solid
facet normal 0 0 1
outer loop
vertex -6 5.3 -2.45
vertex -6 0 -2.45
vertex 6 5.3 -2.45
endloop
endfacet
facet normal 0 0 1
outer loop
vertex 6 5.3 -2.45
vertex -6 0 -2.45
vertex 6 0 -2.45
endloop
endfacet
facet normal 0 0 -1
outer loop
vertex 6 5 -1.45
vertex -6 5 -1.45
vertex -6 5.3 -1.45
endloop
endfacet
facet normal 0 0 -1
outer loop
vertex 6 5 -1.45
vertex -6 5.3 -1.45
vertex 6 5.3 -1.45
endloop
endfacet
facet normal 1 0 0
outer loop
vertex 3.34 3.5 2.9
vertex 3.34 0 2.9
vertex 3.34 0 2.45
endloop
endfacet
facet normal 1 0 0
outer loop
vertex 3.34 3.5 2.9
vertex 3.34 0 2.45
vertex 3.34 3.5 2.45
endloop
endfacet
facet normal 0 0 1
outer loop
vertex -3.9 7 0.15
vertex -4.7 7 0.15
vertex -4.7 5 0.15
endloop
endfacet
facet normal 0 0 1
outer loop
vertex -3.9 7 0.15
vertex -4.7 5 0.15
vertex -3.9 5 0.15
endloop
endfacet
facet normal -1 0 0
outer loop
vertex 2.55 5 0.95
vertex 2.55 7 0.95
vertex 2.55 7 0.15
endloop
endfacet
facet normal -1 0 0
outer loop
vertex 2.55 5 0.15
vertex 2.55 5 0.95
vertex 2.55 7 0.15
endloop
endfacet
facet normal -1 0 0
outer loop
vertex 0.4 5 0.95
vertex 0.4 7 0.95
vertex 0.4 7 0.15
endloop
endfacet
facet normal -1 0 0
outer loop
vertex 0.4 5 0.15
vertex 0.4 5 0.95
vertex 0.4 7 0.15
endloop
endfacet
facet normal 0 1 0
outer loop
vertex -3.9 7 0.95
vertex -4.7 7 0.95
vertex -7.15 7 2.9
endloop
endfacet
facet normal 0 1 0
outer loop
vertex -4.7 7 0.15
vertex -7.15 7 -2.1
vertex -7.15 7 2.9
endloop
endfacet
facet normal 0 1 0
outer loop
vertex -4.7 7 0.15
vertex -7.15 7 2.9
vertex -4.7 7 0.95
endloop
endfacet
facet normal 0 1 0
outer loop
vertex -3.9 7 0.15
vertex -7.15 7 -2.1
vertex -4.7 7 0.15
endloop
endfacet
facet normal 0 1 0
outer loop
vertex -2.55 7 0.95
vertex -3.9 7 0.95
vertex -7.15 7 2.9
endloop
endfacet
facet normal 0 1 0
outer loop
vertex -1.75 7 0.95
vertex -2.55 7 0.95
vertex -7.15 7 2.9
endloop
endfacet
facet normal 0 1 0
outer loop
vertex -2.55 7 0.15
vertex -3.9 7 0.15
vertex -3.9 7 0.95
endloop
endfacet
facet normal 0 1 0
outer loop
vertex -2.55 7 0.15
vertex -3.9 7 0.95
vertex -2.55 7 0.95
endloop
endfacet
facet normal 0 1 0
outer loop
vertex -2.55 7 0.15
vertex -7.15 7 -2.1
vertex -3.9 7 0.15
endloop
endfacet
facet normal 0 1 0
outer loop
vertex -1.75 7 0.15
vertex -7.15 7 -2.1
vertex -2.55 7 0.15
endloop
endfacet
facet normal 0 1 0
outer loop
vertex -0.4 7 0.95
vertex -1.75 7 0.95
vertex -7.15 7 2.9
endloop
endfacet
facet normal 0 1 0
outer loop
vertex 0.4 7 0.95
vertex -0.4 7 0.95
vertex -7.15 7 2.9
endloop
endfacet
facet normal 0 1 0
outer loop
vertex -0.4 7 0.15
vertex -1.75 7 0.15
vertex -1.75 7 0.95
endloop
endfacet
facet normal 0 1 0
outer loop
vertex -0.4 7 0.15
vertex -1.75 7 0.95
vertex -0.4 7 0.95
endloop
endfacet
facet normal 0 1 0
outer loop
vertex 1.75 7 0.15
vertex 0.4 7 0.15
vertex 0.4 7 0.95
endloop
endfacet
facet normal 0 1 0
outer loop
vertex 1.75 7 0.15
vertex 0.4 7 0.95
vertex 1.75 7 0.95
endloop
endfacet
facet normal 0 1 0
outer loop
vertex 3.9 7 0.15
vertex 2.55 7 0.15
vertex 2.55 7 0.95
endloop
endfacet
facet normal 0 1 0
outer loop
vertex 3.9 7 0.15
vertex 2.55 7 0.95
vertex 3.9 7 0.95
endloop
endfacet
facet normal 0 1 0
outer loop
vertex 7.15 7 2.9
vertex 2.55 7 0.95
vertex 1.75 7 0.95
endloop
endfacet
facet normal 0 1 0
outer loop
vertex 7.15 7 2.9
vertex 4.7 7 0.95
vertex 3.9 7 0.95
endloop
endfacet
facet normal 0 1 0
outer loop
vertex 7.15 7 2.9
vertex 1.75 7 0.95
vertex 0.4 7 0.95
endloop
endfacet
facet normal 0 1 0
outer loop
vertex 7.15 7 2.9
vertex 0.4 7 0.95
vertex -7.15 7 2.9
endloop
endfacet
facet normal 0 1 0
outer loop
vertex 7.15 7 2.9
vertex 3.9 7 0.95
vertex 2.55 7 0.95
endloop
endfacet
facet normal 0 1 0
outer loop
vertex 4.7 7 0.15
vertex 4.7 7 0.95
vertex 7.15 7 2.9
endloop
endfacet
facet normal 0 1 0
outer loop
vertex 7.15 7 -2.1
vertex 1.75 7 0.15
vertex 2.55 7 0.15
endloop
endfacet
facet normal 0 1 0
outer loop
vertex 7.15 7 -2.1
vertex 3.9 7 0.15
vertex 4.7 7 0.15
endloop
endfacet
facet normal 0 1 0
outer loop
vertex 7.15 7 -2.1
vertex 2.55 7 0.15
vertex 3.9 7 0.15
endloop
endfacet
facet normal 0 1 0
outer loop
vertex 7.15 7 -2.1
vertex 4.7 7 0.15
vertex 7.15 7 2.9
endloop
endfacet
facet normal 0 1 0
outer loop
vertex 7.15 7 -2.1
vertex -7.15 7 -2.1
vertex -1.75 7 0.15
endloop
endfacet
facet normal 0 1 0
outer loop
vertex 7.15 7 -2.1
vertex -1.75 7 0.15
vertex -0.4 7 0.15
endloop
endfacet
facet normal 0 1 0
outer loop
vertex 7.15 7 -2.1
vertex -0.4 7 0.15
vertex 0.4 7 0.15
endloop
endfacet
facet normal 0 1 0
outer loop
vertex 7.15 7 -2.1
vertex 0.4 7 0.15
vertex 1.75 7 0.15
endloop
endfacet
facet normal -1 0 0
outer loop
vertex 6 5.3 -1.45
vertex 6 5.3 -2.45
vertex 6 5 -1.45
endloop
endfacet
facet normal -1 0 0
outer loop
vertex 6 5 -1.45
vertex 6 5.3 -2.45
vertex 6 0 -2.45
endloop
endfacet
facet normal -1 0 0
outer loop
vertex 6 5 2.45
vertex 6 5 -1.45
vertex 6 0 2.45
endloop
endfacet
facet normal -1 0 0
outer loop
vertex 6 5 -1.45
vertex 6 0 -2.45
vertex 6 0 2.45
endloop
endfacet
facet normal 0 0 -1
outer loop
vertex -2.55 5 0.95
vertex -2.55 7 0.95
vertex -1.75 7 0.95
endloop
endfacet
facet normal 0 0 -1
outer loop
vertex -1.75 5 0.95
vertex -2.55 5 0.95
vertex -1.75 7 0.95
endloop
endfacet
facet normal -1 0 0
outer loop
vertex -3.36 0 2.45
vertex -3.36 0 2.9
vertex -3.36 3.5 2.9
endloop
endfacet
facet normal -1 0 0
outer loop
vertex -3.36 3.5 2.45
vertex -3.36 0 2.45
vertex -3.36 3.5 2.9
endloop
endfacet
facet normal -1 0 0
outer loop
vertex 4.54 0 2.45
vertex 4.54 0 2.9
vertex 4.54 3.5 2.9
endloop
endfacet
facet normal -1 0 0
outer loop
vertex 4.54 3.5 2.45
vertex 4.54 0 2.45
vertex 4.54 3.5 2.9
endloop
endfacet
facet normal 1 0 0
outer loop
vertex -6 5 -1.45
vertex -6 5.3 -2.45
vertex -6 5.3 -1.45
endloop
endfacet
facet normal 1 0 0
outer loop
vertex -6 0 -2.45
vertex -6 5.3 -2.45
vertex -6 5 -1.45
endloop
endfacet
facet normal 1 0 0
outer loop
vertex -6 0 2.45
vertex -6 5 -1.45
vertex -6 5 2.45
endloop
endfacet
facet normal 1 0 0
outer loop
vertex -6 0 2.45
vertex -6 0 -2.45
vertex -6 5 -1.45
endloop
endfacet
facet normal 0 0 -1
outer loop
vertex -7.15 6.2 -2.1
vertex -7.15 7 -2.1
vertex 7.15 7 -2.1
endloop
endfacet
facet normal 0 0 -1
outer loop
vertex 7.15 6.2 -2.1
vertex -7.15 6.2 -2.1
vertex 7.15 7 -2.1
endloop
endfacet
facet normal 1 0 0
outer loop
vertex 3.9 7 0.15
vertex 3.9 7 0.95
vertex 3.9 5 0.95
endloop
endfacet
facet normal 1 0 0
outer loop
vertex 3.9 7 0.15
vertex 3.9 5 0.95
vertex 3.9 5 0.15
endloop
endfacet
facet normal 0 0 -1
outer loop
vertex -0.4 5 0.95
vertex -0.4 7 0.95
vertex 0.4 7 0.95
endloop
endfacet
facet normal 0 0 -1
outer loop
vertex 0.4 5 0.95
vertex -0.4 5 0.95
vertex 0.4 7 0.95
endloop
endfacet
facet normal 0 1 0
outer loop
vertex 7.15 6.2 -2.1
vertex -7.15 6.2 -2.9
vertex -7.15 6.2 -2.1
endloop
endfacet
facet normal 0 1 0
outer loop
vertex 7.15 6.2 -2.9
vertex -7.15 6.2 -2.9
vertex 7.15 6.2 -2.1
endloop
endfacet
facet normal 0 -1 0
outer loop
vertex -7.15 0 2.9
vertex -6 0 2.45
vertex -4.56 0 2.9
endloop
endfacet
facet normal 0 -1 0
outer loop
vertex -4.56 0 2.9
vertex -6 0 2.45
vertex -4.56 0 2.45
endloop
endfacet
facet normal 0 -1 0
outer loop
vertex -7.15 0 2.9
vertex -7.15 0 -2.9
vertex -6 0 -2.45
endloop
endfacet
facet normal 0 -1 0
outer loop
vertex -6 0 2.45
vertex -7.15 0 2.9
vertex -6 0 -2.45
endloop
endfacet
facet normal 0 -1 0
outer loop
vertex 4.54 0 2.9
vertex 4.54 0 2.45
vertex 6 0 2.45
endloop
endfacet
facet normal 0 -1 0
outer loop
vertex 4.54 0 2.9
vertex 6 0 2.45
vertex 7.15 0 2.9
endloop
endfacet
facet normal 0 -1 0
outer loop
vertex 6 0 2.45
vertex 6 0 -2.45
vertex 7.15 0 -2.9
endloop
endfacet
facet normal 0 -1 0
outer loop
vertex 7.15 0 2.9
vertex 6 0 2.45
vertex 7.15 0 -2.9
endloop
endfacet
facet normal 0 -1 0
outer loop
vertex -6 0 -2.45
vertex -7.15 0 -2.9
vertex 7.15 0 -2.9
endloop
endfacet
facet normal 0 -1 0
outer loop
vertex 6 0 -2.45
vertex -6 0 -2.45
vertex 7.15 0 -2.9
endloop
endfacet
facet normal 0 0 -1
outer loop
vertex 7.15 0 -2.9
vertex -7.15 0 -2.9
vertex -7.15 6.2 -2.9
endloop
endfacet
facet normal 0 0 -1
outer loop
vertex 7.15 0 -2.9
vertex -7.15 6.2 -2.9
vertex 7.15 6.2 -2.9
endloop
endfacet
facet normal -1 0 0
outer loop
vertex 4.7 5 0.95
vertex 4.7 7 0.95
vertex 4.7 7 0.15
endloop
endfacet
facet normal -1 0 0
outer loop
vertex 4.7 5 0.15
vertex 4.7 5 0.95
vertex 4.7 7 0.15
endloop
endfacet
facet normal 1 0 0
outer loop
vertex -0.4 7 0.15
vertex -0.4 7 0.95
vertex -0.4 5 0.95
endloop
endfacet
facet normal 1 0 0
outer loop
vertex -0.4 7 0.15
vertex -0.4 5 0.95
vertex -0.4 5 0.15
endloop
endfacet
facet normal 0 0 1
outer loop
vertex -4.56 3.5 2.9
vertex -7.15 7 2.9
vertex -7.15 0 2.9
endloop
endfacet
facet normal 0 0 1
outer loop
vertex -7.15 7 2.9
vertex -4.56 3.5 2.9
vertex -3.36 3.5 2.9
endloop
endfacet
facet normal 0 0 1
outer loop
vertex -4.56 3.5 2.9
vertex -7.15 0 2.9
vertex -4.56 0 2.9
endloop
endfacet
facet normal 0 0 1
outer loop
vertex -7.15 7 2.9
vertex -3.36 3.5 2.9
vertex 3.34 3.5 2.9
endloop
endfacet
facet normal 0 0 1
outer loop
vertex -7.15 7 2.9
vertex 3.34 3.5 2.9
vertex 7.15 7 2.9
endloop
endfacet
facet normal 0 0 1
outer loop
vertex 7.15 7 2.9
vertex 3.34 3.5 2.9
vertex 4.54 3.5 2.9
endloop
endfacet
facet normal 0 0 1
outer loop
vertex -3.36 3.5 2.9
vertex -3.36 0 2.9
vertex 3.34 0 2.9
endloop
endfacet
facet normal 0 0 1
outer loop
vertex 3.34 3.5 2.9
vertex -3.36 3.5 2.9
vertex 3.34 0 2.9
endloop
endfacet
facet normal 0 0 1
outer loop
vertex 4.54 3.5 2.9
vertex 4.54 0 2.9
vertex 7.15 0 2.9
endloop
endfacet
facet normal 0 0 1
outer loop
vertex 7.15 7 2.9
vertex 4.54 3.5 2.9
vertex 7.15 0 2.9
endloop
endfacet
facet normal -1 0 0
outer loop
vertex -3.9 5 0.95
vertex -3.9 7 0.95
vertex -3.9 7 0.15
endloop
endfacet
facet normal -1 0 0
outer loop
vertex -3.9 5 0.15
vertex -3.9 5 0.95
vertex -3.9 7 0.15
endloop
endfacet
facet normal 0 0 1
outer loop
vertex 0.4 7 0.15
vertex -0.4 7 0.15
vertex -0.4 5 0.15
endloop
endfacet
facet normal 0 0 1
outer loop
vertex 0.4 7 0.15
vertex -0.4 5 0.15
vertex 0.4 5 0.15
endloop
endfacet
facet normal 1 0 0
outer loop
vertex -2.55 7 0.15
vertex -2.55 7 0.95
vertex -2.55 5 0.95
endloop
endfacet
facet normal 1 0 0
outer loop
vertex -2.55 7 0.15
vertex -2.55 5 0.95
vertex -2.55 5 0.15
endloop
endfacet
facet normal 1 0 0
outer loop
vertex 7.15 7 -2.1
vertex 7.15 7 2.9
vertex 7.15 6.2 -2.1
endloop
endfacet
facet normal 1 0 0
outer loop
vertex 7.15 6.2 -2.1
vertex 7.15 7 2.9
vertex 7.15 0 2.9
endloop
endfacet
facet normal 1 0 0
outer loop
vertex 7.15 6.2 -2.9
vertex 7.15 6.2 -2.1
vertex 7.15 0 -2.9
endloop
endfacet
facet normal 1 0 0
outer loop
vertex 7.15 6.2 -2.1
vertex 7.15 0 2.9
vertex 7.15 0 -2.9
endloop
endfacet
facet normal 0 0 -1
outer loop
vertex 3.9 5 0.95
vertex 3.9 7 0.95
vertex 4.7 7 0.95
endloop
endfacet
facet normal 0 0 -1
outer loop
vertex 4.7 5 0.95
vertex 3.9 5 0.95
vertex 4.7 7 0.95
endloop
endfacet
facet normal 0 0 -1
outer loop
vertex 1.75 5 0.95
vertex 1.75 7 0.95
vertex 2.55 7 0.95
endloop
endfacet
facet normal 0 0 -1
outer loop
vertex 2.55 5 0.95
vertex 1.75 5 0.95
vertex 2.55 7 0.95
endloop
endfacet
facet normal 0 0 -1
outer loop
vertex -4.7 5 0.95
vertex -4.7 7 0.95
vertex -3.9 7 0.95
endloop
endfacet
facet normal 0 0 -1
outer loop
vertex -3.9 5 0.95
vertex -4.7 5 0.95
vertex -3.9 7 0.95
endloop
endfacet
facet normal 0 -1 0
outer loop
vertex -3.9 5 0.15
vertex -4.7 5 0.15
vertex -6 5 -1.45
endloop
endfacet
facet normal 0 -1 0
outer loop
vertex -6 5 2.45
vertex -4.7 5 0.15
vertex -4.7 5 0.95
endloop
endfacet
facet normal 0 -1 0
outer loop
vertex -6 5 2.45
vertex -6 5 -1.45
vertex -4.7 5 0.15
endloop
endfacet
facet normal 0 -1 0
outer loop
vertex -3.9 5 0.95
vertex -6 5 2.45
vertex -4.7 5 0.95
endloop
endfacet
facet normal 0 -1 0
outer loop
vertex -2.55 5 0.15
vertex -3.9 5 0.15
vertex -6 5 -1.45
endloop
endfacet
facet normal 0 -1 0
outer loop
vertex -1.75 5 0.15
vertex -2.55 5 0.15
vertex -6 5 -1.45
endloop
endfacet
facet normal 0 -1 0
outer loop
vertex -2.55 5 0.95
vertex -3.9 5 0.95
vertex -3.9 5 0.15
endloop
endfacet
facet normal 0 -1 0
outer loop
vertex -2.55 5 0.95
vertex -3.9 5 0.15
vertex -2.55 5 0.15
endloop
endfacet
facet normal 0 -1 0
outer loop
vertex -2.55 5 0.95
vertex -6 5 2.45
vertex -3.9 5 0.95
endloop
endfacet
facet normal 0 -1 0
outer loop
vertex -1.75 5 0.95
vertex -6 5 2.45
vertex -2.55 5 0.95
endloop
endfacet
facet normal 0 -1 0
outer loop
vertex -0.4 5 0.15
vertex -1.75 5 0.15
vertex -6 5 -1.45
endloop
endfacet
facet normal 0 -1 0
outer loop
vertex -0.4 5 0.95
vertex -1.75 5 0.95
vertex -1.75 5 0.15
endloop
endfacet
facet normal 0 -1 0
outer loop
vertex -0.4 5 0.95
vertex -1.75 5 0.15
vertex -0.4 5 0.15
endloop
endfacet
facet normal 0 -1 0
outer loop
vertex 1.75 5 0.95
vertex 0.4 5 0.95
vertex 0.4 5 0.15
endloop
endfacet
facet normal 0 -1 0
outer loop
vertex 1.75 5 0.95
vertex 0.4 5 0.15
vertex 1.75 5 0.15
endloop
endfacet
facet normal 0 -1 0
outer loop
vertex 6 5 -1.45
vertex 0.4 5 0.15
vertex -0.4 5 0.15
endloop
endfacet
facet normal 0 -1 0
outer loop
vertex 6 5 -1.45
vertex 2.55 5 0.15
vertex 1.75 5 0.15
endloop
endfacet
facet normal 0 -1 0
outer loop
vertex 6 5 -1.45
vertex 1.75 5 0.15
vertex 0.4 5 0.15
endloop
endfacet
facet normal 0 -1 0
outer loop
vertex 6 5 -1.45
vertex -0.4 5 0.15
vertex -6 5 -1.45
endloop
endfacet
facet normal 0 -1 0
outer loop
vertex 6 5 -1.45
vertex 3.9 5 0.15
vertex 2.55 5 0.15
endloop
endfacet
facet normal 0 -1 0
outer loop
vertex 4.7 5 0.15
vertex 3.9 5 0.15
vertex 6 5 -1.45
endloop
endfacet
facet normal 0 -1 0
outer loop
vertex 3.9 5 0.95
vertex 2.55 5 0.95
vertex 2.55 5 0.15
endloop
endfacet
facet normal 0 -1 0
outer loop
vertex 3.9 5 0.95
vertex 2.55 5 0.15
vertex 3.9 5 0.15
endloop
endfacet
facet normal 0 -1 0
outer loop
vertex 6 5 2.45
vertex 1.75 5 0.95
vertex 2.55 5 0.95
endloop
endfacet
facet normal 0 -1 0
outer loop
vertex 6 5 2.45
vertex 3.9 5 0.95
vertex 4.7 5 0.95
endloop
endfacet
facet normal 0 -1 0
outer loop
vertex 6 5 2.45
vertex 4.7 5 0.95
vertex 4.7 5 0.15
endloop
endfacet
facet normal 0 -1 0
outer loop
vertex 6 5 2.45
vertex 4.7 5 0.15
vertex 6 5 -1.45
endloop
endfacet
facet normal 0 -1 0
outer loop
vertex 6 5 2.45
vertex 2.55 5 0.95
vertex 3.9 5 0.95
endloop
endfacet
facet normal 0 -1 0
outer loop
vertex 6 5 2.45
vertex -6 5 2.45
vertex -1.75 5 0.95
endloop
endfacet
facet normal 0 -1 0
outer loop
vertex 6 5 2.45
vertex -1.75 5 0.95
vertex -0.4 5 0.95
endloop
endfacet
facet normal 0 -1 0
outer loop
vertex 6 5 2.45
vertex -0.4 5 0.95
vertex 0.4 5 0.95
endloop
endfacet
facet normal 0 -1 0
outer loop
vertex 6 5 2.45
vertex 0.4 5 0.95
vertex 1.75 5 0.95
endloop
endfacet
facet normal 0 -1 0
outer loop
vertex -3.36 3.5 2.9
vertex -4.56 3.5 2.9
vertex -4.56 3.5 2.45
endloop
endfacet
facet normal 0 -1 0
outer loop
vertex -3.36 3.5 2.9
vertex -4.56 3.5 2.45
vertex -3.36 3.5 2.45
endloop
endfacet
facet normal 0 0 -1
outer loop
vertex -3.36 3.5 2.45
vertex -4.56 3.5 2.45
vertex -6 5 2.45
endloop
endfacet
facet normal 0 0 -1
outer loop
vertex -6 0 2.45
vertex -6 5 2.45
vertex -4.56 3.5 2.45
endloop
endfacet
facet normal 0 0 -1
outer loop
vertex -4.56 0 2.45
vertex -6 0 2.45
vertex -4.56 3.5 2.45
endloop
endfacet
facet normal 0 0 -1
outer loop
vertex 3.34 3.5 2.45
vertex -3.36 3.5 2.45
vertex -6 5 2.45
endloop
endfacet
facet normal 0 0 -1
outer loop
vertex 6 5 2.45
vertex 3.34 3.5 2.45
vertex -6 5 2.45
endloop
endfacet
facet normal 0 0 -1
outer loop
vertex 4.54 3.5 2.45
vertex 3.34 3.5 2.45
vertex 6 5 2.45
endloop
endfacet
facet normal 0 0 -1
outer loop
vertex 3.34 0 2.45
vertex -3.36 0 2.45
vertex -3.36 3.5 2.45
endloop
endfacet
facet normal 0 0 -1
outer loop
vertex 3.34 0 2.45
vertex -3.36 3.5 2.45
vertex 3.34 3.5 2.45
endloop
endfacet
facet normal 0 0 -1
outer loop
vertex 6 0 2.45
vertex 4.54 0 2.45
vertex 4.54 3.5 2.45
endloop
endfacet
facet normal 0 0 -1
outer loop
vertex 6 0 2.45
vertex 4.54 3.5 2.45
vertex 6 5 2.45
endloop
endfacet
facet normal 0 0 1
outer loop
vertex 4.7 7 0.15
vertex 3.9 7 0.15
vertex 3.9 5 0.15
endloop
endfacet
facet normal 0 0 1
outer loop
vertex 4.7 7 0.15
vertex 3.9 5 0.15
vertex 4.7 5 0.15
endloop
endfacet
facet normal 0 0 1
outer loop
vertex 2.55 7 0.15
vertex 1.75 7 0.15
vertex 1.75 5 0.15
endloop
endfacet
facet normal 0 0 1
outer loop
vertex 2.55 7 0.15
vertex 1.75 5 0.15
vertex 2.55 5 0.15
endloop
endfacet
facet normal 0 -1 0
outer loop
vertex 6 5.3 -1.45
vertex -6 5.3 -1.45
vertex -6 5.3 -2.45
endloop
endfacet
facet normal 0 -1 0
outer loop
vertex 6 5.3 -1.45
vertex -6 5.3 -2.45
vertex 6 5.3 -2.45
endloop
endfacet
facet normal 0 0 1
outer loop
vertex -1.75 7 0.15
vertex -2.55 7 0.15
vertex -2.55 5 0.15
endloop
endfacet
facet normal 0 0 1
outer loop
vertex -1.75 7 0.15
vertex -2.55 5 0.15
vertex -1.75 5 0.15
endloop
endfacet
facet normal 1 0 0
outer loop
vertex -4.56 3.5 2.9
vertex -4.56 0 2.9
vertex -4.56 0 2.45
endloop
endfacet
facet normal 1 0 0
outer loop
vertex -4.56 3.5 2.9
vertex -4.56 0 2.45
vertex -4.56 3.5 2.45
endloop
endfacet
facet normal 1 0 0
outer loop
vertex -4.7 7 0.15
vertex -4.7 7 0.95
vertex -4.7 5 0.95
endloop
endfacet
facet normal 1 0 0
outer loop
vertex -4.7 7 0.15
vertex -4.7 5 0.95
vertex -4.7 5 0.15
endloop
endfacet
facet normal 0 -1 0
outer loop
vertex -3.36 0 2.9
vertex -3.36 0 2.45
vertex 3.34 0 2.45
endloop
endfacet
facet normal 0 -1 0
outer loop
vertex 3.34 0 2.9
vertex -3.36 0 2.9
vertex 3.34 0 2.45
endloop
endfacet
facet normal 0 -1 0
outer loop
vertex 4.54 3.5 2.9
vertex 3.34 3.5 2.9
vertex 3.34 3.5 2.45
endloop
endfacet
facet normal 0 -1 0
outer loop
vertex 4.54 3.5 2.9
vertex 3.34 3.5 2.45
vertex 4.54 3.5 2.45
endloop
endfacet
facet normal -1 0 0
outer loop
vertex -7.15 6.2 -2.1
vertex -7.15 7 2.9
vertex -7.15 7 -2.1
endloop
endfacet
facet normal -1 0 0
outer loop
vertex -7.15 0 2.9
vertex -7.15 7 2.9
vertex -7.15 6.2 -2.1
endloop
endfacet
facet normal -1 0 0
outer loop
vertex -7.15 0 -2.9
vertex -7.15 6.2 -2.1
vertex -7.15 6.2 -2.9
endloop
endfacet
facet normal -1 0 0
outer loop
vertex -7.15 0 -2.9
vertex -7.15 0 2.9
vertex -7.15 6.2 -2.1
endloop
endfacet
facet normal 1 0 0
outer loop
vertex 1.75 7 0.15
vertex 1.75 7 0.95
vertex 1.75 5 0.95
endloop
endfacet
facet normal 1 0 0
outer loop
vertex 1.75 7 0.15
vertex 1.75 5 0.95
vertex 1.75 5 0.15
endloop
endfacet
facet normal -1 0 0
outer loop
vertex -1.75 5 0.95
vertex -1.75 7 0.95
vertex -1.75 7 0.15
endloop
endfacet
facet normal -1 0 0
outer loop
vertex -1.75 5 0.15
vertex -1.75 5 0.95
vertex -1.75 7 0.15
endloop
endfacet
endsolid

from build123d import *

# Parameters (mm, degrees)
SKETCH1_W           = 14.3
SKETCH1_H           = 5.8
BOSS_EXTRUDE1_DEPTH = 7
SKETCH3_W           = 12
SKETCH3_H           = 4.9
CUT_EXTRUDE1_DEPTH  = 5
SKETCH4_W           = 1.2
SKETCH4_H           = 3.5
CUT_EXTRUDE2_DEPTH  = 4
SKETCH5_W           = 14.3
SKETCH5_H           = 0.8
CUT_EXTRUDE3_DEPTH  = 0.8
SKETCH6_W           = 0.8
SKETCH6_H           = 0.8
CUT_EXTRUDE4_DEPTH  = 10
SKETCH7_W           = 12
SKETCH7_H           = 1
CUT_EXTRUDE5_DEPTH  = 0.3


with BuildPart() as part:
    # Sketch1 → Boss-Extrude1 (new body)
    with BuildSketch(Plane(origin=(0, 0, 0), x_dir=(1, 0, 0), z_dir=(0, 1, 0))):
        Rectangle(SKETCH1_W, SKETCH1_H)
    extrude(amount=BOSS_EXTRUDE1_DEPTH)

    # Sketch3 → Cut-Extrude1 (cut)
    with BuildSketch(Plane.XZ):
        Rectangle(SKETCH3_W, SKETCH3_H)
    extrude(amount=-CUT_EXTRUDE1_DEPTH, mode=Mode.SUBTRACT)

    # Sketch4 → Cut-Extrude2 (cut)
    with BuildSketch(Plane.XY.offset(2.9)):
        with Locations((-3.96, 1.75)):
            Rectangle(SKETCH4_W, SKETCH4_H)
        with Locations((3.94, 1.75)):
            Rectangle(SKETCH4_W, SKETCH4_H)
    extrude(amount=-CUT_EXTRUDE2_DEPTH, mode=Mode.SUBTRACT)

    # Sketch5 → Cut-Extrude3 (cut)
    with BuildSketch(Plane(origin=(0, 7, 0), x_dir=(1, 0, 0), z_dir=(0, 1, 0))):
        with Locations((0, 2.5)):
            Rectangle(SKETCH5_W, SKETCH5_H)
    extrude(amount=-CUT_EXTRUDE3_DEPTH, mode=Mode.SUBTRACT)

    # Sketch6 → Cut-Extrude4 (cut)
    with BuildSketch(Plane(origin=(0, 7, 0), x_dir=(1, 0, 0), z_dir=(0, 1, 0))):
        with Locations((4.3, -0.55)):
            Rectangle(SKETCH6_W, SKETCH6_H)
        with Locations((2.15, -0.55)):
            Rectangle(SKETCH6_W, SKETCH6_H)
        with Locations((0, -0.55)):
            Rectangle(SKETCH6_W, SKETCH6_H)
        with Locations((-2.15, -0.55)):
            Rectangle(SKETCH6_W, SKETCH6_H)
        with Locations((-4.3, -0.55)):
            Rectangle(SKETCH6_W, SKETCH6_H)
    extrude(amount=-CUT_EXTRUDE4_DEPTH, mode=Mode.SUBTRACT)

    # Sketch7 → Cut-Extrude5 (cut)
    with BuildSketch(Plane.XZ.offset(-5)):
        with Locations((0, -1.95)):
            Rectangle(SKETCH7_W, SKETCH7_H)
    extrude(amount=-CUT_EXTRUDE5_DEPTH, mode=Mode.SUBTRACT)


solid = part.part
